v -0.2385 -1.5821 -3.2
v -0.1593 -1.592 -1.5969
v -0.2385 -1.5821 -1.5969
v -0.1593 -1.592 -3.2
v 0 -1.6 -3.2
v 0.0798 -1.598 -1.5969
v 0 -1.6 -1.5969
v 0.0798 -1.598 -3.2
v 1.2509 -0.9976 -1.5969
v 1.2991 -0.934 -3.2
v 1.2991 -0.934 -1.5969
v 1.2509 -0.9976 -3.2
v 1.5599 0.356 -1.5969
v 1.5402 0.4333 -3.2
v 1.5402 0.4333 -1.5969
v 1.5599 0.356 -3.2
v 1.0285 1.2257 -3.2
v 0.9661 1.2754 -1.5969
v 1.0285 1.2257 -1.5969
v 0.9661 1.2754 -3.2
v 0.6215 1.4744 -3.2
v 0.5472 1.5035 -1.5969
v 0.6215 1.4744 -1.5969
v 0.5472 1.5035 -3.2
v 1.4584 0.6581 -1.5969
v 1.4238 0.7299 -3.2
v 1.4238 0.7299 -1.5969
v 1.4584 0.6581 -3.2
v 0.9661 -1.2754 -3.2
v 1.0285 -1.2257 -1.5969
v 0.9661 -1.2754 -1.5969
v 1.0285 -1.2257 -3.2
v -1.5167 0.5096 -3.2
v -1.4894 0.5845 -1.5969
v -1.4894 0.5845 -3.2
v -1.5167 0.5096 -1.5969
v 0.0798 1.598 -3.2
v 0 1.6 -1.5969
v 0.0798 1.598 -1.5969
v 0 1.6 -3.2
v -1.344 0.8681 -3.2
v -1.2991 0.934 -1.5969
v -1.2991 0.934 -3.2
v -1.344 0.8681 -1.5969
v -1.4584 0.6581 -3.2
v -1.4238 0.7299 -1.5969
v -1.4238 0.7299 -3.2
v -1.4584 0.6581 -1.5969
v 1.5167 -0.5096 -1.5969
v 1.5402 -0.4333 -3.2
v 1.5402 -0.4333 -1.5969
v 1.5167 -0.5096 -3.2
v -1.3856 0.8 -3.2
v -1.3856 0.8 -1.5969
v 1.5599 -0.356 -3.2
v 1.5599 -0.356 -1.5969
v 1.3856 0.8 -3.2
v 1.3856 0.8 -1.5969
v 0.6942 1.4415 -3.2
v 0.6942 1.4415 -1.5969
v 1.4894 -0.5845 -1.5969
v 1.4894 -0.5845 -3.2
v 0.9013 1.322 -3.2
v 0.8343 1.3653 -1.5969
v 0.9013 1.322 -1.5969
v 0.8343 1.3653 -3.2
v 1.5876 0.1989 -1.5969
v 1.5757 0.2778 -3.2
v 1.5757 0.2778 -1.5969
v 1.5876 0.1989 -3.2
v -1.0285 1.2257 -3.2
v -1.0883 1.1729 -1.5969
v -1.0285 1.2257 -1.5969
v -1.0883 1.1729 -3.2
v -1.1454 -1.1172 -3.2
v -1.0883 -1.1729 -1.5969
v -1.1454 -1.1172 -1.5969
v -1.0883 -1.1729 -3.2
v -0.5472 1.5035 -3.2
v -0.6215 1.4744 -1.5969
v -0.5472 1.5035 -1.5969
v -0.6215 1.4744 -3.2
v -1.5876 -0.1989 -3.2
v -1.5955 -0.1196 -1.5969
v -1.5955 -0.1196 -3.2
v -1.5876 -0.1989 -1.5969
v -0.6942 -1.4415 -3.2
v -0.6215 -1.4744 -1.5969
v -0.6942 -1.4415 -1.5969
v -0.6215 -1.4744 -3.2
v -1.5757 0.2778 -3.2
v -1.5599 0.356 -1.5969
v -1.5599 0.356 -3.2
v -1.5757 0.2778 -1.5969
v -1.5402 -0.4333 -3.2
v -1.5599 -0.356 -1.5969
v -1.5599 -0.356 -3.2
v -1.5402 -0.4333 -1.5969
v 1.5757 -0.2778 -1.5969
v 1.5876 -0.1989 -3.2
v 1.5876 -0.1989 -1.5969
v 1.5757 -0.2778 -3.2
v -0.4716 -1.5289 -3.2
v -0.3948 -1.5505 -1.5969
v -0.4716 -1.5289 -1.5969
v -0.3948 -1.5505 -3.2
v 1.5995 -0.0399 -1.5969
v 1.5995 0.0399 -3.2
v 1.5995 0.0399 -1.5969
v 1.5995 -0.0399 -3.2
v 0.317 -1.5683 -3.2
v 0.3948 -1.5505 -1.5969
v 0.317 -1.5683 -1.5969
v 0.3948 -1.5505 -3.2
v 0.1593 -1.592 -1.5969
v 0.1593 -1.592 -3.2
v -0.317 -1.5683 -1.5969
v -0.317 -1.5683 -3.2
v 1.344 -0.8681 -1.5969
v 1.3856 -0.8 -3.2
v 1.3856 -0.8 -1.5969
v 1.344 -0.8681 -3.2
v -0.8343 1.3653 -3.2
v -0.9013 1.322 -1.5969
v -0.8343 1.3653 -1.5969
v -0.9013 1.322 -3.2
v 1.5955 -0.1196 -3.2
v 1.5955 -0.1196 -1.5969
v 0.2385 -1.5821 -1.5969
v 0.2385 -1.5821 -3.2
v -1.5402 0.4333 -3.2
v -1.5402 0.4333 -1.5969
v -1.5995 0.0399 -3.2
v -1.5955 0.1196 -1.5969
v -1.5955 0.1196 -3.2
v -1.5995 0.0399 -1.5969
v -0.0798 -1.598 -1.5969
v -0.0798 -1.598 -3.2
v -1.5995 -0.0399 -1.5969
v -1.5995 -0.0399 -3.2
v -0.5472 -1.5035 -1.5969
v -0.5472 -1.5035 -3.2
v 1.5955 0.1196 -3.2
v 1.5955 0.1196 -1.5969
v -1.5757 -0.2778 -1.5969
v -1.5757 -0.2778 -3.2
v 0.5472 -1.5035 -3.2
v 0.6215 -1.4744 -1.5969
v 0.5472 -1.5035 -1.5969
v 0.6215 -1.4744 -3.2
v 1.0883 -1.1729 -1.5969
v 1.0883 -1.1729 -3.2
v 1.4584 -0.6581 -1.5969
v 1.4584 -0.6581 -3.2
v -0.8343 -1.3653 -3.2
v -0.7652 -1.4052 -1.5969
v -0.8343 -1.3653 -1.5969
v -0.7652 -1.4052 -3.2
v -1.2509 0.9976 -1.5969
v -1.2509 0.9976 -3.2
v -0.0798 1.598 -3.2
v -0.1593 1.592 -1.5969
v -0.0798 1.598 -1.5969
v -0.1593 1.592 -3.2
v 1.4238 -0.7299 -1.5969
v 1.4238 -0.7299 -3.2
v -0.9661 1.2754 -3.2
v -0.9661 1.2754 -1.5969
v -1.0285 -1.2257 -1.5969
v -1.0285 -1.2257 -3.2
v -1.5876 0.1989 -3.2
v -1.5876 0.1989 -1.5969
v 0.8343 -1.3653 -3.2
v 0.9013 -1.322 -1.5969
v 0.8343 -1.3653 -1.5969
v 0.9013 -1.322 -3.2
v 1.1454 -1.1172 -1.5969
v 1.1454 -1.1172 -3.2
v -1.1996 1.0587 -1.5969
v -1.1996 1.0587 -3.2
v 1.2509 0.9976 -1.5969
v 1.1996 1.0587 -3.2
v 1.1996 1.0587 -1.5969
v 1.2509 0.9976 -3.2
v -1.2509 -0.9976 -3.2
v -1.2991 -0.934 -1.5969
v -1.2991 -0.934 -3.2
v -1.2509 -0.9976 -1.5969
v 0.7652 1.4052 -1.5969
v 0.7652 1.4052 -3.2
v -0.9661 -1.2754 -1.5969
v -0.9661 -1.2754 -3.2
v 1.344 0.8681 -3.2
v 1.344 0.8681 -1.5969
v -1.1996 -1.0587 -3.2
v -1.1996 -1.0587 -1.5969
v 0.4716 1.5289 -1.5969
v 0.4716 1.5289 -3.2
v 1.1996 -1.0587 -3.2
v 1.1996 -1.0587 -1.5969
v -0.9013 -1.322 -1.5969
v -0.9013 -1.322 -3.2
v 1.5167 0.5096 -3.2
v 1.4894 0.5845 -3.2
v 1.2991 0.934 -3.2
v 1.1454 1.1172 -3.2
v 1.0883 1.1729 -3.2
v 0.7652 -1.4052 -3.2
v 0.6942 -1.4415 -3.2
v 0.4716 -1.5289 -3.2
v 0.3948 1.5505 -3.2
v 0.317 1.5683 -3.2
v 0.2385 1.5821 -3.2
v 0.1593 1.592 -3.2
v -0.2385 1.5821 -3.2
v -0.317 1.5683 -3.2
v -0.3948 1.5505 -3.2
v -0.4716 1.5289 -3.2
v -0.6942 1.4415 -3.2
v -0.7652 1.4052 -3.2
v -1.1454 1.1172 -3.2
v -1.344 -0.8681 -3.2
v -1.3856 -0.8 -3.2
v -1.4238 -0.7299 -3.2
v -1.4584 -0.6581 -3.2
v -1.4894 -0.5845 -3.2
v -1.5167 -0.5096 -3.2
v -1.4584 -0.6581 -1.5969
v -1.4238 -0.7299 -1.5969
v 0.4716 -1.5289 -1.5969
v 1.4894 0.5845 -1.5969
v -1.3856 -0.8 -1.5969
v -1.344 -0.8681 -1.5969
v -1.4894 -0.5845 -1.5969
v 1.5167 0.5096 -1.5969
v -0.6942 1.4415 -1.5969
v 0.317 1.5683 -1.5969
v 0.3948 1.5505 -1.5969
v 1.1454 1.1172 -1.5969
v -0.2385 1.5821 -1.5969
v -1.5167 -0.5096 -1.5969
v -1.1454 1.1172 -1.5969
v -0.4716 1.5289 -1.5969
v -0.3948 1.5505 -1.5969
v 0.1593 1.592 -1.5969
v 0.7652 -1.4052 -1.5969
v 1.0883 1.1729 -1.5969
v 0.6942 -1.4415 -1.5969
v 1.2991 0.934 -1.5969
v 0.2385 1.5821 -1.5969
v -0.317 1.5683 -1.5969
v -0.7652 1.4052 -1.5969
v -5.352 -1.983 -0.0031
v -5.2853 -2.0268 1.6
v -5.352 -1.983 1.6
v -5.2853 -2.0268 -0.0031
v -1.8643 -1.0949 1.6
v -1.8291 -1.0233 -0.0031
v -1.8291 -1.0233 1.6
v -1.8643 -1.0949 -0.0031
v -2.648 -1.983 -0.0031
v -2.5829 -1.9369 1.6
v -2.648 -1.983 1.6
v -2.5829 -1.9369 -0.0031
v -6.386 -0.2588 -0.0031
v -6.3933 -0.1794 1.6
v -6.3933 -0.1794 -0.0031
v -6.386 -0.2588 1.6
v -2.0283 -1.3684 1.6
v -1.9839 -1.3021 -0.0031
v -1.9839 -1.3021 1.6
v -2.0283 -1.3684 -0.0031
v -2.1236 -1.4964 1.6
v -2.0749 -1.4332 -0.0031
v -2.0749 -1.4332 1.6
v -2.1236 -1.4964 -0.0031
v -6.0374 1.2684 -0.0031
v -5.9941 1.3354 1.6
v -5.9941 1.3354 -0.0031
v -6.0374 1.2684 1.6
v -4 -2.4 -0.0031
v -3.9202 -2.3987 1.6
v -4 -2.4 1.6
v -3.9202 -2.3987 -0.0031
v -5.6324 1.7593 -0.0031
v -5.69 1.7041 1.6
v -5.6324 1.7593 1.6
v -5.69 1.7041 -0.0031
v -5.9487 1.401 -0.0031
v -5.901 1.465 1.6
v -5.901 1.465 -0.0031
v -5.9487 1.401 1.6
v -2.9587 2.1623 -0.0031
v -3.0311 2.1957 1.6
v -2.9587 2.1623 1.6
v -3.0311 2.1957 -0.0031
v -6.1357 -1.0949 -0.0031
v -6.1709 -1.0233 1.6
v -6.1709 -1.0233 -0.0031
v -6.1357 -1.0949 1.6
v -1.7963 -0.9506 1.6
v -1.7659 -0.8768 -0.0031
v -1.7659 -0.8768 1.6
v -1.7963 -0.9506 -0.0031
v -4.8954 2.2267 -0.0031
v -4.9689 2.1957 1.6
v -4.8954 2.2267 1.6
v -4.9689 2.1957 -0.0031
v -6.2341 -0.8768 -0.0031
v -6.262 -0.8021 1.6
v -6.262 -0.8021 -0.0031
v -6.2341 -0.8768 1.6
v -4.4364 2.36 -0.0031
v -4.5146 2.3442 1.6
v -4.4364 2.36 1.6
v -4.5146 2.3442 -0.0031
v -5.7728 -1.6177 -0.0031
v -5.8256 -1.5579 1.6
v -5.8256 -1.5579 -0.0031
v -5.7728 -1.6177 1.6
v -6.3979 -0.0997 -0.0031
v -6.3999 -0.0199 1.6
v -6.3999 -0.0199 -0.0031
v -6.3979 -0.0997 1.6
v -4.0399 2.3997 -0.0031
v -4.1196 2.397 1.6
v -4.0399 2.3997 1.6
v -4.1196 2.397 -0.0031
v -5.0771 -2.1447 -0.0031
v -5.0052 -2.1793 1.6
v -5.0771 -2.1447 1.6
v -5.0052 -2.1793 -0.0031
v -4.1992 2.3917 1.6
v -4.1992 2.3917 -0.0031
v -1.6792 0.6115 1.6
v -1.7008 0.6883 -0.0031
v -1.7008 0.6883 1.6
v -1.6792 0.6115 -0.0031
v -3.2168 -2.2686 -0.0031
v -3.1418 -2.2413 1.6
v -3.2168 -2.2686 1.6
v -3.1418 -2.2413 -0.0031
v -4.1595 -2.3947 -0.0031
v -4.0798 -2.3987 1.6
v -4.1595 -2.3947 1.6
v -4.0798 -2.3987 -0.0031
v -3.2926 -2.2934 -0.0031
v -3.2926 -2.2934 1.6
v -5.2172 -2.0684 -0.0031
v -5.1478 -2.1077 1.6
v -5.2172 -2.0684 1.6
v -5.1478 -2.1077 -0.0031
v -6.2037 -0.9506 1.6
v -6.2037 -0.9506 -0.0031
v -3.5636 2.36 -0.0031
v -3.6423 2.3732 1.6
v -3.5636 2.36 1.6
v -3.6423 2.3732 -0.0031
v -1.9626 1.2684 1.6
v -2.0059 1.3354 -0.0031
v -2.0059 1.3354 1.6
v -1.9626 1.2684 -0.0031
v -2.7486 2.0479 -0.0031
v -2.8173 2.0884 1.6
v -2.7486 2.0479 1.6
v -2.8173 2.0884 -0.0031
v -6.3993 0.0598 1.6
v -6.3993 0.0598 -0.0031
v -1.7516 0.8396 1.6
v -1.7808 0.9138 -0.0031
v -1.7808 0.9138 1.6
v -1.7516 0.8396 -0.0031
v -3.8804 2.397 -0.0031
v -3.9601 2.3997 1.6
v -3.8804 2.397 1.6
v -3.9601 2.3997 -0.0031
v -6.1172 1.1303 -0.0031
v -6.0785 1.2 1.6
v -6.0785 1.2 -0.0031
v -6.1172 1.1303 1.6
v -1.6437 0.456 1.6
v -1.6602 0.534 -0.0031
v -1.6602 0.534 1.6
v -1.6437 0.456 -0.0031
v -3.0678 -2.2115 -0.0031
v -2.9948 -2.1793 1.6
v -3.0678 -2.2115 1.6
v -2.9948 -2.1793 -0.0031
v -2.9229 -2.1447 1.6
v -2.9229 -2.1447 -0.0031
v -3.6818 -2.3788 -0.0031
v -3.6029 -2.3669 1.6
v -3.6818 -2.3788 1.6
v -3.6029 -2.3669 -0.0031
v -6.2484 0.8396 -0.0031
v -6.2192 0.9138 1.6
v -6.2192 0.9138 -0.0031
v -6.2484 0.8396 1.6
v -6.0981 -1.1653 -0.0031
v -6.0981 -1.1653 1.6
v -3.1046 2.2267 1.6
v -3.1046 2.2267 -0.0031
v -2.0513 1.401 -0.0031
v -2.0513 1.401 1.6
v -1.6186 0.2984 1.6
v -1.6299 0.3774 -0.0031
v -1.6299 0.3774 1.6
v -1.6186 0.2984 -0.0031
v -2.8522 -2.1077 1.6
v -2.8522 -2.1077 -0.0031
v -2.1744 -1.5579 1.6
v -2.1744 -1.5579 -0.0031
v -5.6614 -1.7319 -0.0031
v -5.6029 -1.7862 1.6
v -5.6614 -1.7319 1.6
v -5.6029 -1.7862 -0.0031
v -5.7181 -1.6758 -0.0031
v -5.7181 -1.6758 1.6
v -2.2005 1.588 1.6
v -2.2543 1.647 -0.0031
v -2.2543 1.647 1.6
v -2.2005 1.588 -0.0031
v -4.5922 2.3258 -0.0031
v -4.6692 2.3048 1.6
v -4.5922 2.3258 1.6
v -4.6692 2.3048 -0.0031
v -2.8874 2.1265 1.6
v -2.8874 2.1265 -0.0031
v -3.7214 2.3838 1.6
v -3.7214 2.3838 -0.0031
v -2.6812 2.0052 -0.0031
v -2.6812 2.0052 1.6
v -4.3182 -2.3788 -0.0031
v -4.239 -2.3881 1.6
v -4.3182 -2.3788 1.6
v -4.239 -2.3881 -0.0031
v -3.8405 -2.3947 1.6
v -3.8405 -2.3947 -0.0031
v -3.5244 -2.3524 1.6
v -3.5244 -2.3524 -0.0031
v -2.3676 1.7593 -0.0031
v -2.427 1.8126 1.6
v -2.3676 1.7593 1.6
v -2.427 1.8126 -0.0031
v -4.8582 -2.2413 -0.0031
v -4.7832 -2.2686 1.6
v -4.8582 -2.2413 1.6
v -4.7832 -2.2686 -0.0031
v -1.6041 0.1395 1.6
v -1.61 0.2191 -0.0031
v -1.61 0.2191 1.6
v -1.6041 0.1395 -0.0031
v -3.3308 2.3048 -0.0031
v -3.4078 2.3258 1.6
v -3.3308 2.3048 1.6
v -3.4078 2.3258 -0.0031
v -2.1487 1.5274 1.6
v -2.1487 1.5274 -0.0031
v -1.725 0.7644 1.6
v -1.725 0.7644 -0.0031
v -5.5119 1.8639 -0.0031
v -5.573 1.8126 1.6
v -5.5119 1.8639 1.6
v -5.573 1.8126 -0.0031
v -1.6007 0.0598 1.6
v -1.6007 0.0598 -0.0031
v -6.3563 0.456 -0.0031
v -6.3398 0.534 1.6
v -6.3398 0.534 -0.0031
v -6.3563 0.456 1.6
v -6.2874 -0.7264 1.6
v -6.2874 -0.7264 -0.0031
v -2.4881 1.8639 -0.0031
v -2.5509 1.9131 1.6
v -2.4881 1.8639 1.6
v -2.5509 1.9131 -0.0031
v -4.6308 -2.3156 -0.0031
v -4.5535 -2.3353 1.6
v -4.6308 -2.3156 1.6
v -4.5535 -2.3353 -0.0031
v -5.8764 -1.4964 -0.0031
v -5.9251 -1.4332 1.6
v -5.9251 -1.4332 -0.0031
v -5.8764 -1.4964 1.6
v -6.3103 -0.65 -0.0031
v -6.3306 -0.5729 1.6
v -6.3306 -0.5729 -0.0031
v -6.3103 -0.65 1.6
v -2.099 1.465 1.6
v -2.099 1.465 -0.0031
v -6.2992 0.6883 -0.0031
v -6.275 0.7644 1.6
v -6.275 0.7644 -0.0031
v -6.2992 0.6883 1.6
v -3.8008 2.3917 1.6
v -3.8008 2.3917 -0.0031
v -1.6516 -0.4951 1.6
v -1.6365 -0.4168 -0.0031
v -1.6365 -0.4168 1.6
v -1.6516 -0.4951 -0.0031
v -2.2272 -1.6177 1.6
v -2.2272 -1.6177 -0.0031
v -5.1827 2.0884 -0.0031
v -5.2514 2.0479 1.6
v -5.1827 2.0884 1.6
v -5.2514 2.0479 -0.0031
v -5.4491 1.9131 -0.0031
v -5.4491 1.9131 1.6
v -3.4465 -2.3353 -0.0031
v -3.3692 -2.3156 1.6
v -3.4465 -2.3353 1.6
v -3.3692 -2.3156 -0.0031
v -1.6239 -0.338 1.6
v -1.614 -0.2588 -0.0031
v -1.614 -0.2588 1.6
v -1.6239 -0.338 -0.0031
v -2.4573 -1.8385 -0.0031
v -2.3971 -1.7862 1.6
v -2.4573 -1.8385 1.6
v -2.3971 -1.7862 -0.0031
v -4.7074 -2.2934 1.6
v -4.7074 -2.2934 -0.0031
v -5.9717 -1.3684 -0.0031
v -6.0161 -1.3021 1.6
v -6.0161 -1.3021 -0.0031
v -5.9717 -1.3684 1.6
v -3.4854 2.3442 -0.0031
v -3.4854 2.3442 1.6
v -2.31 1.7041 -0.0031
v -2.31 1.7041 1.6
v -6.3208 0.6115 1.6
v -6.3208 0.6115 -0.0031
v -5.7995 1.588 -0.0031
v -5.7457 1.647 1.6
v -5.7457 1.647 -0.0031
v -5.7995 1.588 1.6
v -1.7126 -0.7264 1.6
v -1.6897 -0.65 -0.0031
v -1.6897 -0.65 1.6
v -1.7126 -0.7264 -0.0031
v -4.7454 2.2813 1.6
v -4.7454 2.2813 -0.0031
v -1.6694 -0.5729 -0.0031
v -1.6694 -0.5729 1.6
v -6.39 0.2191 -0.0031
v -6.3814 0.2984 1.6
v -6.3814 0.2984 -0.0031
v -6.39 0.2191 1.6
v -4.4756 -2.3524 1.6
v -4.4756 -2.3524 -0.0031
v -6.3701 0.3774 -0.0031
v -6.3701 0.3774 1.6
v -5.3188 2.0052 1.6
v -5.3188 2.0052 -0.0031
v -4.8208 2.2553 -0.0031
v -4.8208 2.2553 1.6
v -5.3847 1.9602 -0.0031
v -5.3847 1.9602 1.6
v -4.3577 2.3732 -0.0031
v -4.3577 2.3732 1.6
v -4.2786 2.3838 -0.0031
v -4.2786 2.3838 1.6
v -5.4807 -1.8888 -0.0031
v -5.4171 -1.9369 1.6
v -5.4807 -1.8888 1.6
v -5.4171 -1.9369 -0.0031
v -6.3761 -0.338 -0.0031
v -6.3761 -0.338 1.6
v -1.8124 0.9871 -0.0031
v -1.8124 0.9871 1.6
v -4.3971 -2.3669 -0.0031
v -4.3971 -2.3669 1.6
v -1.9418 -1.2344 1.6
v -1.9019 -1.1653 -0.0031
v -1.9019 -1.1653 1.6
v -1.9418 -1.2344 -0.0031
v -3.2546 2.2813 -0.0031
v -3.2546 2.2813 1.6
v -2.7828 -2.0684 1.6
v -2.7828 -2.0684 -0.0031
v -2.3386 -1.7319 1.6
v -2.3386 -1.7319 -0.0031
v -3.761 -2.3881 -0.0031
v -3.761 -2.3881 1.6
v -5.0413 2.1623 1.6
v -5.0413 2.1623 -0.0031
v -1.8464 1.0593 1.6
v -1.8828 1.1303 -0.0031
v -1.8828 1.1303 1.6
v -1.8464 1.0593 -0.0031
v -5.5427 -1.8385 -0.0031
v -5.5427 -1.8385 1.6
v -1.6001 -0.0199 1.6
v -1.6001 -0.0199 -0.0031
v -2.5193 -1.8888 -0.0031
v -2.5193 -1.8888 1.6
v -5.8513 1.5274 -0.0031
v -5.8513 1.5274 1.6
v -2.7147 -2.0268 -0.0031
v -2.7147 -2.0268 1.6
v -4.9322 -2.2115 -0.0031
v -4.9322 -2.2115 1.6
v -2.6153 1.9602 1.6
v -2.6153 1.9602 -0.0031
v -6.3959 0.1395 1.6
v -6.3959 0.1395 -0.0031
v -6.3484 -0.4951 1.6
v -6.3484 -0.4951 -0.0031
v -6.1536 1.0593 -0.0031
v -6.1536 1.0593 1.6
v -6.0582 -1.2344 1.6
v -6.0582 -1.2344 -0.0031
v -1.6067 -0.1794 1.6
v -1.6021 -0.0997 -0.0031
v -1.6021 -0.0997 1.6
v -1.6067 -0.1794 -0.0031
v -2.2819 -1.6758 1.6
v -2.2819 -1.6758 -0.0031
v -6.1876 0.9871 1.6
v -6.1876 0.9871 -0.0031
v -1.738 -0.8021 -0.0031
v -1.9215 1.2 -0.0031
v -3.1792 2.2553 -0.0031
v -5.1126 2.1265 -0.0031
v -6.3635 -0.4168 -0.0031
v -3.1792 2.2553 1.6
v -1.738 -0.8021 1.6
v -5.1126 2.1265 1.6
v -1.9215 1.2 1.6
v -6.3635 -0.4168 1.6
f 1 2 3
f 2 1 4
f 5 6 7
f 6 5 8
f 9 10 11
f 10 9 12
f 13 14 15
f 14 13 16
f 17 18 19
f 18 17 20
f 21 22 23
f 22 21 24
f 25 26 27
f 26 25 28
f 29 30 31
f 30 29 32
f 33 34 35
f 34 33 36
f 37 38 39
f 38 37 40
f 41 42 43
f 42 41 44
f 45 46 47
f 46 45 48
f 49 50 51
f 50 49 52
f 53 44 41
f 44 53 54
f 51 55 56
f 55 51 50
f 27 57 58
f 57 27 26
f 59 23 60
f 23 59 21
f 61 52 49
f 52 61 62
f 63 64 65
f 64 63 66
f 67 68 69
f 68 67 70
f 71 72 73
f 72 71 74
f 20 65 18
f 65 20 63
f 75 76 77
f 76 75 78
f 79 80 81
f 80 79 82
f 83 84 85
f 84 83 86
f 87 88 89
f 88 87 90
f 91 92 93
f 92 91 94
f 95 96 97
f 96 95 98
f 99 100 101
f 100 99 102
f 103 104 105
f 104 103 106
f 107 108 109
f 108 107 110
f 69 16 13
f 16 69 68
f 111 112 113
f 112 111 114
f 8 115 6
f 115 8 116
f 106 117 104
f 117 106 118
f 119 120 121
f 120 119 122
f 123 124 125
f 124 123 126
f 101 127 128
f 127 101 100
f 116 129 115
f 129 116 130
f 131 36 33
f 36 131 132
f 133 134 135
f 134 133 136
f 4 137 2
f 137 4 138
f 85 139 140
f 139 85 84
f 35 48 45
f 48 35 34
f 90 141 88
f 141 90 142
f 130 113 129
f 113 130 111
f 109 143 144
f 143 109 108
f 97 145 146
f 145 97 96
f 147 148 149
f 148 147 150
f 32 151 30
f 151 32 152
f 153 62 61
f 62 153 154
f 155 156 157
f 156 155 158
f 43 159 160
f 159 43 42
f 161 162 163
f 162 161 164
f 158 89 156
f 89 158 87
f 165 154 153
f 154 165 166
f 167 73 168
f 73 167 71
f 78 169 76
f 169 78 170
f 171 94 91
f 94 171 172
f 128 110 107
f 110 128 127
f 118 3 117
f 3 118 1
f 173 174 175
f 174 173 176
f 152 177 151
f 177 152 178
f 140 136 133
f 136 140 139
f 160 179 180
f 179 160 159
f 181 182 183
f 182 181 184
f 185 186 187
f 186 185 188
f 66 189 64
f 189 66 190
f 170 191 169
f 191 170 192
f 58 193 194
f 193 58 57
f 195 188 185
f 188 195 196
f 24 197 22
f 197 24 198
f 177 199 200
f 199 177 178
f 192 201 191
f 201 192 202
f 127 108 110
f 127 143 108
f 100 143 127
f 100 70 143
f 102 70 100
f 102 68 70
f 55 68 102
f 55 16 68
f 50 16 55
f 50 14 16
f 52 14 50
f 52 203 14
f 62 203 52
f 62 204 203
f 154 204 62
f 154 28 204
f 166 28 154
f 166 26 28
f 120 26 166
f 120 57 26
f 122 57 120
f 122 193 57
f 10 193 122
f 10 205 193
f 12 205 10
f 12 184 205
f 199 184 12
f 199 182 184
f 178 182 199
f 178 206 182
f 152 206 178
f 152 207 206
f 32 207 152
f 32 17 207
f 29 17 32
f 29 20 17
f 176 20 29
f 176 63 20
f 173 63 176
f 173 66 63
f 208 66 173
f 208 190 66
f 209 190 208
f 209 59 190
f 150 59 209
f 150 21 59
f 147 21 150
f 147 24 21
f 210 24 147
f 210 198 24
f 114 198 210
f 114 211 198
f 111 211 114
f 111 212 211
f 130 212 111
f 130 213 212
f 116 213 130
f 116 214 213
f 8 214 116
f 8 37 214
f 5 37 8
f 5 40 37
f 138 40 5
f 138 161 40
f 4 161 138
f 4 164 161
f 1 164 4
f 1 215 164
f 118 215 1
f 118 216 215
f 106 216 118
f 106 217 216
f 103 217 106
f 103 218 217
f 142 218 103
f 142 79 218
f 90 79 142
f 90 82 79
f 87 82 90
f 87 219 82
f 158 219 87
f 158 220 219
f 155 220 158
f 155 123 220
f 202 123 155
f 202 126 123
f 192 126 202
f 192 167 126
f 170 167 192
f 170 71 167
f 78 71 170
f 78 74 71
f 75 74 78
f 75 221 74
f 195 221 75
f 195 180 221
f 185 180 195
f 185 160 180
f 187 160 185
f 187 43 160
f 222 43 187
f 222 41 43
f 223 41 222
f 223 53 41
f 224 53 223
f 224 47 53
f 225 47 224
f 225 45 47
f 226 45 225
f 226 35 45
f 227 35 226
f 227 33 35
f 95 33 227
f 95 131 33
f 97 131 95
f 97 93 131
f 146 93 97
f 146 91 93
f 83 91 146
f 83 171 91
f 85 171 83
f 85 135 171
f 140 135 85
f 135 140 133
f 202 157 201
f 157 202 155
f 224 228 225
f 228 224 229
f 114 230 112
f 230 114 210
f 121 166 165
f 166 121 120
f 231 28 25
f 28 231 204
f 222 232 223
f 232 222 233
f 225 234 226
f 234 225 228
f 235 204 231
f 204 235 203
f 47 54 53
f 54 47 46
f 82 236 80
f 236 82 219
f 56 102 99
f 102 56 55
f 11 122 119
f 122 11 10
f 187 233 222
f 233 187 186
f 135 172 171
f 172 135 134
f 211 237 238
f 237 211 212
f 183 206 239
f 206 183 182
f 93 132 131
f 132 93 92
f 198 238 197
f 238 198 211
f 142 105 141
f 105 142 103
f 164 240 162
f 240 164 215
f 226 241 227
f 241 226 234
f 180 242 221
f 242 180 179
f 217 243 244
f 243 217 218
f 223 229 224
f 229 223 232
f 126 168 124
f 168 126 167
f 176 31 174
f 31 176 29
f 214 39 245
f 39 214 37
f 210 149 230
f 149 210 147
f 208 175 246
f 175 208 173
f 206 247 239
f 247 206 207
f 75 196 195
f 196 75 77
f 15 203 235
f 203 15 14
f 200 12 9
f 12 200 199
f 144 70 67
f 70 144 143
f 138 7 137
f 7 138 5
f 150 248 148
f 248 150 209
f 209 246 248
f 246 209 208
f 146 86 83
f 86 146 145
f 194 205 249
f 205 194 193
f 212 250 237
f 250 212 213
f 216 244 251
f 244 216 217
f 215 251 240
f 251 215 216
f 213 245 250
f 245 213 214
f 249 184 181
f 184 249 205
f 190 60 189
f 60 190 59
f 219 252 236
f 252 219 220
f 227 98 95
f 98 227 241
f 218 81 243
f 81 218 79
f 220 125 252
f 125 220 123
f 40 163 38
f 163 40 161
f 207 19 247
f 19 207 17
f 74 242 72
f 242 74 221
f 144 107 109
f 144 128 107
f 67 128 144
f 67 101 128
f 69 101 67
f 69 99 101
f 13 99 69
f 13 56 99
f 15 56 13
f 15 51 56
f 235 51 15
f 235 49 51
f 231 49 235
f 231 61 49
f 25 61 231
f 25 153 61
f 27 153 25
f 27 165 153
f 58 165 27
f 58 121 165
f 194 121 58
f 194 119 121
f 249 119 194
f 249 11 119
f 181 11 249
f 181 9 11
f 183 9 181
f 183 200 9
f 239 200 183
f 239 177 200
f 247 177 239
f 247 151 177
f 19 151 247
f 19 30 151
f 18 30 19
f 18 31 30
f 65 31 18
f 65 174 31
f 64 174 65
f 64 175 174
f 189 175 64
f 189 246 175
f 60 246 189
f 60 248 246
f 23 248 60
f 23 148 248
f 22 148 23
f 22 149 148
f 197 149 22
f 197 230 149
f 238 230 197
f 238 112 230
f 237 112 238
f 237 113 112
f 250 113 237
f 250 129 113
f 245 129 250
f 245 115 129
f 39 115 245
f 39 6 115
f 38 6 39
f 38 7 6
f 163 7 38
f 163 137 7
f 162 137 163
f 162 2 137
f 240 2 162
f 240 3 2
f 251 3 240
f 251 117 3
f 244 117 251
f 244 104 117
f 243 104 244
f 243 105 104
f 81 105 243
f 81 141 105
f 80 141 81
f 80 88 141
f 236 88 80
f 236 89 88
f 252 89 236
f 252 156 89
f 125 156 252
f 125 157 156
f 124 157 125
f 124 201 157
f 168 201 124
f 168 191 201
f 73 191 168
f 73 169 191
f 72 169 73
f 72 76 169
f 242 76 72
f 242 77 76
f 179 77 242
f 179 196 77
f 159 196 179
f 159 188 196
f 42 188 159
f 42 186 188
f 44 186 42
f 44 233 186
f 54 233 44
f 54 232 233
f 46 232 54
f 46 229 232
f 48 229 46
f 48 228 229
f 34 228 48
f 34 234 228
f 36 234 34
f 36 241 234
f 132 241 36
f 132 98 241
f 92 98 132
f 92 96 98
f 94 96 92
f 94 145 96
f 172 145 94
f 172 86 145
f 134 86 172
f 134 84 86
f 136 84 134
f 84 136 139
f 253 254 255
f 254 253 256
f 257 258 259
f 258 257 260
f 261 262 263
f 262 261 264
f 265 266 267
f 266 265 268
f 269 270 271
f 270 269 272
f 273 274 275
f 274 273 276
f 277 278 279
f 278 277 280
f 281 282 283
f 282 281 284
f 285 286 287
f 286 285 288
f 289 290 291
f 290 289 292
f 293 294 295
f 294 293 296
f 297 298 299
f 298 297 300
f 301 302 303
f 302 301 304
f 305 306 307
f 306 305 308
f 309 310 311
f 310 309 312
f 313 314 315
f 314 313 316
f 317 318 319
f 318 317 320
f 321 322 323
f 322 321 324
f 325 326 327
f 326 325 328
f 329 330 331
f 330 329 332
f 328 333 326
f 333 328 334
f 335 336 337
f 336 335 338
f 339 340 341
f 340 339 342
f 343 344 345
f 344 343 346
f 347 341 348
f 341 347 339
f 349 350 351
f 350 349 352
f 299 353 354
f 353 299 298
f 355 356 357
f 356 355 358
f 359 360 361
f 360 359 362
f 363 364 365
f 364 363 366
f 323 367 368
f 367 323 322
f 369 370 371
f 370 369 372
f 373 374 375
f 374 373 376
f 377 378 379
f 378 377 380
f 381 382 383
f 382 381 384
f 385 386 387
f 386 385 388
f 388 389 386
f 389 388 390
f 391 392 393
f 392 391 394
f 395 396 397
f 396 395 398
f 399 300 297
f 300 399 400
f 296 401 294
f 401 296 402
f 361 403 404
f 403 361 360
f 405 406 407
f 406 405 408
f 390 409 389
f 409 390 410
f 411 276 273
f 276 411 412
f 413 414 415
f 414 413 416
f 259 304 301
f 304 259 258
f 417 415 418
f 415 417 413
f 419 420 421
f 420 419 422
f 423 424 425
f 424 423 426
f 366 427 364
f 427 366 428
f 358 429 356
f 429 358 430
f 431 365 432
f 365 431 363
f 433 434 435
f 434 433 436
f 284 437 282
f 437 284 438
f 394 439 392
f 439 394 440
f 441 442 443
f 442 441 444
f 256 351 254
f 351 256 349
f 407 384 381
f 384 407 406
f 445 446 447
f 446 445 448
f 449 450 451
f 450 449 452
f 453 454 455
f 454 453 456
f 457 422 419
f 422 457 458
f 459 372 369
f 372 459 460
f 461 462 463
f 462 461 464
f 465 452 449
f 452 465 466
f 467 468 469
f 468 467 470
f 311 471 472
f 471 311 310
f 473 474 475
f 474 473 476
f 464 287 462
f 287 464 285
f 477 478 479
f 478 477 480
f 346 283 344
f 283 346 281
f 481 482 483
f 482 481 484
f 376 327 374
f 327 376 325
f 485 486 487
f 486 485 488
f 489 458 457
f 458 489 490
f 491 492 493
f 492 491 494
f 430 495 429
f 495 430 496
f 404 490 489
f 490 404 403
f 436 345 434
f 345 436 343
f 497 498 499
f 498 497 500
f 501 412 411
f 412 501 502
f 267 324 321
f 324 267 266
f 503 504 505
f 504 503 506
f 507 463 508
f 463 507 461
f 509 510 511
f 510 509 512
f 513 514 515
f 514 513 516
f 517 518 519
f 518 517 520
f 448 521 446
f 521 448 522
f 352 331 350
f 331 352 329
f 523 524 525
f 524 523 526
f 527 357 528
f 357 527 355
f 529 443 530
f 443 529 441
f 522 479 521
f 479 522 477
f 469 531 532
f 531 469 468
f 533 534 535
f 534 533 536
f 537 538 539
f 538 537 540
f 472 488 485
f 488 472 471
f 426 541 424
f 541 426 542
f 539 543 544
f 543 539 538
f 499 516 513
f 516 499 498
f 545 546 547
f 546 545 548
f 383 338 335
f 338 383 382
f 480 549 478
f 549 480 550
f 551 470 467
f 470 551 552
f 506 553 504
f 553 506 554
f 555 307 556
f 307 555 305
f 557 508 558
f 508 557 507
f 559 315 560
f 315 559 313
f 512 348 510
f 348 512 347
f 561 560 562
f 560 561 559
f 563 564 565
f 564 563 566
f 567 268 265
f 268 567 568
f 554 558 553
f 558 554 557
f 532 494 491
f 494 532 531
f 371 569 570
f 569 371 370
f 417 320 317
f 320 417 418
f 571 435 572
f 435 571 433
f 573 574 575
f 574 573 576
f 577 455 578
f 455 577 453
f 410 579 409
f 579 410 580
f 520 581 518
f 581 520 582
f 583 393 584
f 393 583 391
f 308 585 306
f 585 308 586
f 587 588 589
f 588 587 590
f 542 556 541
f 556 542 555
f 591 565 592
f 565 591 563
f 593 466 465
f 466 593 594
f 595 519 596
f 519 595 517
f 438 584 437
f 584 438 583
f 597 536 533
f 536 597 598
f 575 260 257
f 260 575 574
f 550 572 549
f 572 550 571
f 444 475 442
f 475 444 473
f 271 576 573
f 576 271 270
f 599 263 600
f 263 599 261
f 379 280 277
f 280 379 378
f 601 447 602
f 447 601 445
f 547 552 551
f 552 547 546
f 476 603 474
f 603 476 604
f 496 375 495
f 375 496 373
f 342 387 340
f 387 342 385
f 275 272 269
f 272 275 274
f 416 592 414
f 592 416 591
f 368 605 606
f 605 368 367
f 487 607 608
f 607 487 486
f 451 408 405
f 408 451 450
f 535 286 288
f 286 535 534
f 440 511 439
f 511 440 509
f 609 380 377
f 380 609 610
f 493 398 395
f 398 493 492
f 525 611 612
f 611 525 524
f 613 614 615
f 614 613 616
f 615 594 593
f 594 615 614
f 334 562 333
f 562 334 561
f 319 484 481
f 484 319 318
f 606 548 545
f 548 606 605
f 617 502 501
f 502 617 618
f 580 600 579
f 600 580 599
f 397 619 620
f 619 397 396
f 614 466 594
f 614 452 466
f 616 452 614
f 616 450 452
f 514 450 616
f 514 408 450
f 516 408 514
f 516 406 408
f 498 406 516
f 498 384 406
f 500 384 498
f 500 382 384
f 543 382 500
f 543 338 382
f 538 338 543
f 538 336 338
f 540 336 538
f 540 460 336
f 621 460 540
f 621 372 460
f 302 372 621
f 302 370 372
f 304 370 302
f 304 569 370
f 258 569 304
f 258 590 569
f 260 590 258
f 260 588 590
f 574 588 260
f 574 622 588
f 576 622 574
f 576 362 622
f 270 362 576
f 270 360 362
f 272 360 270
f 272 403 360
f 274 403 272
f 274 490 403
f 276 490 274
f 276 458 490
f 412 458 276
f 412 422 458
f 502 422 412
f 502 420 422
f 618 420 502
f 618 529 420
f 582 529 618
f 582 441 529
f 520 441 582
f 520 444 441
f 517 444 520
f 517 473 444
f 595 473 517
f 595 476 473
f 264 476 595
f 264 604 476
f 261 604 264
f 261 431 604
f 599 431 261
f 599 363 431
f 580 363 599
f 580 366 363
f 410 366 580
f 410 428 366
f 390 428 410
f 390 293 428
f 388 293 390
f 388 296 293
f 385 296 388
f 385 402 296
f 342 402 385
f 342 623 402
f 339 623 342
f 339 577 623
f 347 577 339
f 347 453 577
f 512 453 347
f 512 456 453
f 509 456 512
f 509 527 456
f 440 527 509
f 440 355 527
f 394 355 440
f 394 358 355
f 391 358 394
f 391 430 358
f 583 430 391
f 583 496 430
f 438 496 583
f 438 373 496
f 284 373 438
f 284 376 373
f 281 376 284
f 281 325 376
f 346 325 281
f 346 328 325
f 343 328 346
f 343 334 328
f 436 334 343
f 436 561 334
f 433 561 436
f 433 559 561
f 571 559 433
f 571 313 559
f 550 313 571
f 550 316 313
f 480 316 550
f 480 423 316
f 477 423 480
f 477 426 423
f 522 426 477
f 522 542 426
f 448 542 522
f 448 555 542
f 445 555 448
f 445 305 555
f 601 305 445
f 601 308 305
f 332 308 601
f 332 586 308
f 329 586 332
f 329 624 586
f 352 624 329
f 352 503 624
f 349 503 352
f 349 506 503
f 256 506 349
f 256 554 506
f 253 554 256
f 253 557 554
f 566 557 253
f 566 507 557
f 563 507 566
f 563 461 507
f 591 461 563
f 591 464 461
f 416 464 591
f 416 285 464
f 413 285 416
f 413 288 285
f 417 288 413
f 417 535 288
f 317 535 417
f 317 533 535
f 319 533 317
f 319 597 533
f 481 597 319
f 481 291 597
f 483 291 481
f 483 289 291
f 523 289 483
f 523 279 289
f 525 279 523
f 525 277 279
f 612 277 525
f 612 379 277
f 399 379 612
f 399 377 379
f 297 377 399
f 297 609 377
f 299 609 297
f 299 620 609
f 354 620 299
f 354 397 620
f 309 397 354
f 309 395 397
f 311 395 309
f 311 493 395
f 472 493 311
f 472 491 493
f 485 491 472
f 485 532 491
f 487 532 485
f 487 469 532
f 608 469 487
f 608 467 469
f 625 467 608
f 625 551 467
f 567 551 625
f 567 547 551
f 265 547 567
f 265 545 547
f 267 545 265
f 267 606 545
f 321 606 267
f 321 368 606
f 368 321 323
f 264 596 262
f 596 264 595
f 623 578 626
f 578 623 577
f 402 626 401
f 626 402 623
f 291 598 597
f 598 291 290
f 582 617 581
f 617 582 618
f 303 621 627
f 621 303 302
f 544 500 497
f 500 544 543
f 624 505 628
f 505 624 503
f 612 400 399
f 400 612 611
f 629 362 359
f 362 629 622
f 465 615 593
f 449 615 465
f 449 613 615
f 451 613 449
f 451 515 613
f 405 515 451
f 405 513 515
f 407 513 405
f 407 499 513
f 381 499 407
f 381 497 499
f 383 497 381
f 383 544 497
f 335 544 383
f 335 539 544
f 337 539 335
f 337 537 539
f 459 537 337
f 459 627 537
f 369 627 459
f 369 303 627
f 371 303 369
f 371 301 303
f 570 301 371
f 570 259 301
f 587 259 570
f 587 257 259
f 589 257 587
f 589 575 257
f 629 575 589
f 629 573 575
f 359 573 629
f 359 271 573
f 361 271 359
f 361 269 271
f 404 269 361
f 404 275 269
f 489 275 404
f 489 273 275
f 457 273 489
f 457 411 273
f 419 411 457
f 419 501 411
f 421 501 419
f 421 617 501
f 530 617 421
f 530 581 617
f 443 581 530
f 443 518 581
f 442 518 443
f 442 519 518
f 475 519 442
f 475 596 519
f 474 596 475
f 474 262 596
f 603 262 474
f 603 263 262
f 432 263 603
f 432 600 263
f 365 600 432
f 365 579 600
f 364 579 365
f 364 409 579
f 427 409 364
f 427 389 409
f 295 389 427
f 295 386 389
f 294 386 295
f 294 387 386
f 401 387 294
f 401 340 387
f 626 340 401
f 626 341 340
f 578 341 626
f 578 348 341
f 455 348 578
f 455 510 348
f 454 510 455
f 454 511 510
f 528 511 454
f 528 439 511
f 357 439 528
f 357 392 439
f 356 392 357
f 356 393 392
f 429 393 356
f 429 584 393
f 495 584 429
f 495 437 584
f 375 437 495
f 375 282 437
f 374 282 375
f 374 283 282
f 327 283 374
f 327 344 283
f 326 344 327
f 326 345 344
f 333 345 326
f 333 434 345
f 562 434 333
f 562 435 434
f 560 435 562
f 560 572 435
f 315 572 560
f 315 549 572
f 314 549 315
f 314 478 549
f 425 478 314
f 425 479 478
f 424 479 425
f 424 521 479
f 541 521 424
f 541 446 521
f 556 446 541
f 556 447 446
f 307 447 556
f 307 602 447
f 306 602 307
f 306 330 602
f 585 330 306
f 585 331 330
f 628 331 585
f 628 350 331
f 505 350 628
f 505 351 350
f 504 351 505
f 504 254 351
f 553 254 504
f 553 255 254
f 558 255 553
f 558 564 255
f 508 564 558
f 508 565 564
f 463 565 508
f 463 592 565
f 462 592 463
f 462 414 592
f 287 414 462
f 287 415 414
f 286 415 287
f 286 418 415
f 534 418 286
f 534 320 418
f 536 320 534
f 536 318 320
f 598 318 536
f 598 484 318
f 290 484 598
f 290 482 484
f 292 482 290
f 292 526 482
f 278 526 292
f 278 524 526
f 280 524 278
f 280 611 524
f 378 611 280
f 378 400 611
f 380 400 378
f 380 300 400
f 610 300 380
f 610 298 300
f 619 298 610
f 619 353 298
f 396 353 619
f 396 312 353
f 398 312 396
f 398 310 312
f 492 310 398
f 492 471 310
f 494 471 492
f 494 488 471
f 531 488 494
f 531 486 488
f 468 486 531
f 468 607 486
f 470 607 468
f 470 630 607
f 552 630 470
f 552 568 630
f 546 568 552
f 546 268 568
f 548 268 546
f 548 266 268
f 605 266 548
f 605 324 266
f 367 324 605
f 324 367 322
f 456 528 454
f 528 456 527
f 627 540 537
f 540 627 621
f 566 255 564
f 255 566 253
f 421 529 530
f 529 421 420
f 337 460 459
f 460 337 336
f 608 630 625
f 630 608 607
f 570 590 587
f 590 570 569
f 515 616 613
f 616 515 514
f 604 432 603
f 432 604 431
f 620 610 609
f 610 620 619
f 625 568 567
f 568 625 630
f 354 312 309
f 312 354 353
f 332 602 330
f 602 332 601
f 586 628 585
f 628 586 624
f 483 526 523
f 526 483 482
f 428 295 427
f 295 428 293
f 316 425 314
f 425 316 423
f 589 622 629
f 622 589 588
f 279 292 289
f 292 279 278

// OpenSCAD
use <../lib.scad>
use <../p/box2-5.scad>
use <../p/box4o4a.scad>
use <../p/box5.scad>
use <../p/clip13.scad>
use <../p/rect2p.scad>
use <../p/recte4.scad>
use <../p/stud.scad>
use <../p/stud3.scad>
$fa=1; $fs=0.2;
function ldraw_lib__44861(realsolid=false) = [
// 0 Plate  1 x  2 with Single Clip on Top (Thick C-Clip)
// 0 Name: 44861.dat
// 0 Author: Vincent Messenet [Cheenzo]
// 0 !LDRAW_ORG Part UPDATE 2020-03
// 0 !LICENSE Licensed under CC BY 2.0 and CC BY 4.0 : see CAreadme.txt
// 
// 0 BFC CERTIFY CCW
  [0,"BFC","CERTIFY"],
  [0,"BFC","CCW"],
// 
// 0 !HISTORY 2020-12-29 [PTadmin] Official Update 2020-03
// 
// 
// 1 16 0 4 0 1 0 0 0 -1 0 0 0 1 stud3.dat
  [1,16,0,4,0,1,0,0,0,-1,0,0,0,1, ldraw_lib__stud3(realsolid)],
// 0 BFC INVERTNEXT
  [0,"BFC","INVERTNEXT"],
// 1 16 0 8 0 16 0 0 0 -4 0 0 0 6 box5.dat
  [1,16,0,8,0,16,0,0,0,-4,0,0,0,6, ldraw_lib__box5(realsolid)],
// 1 16 0 8 0 20 0 0 0 1 0 0 0 10 recte4.dat
  [1,16,0,8,0,20,0,0,0,1,0,0,0,10, ldraw_lib__recte4(realsolid)],
// 4 16 20 8 10 16 8 6 -16 8 6 -20 8 10
  [4,16,20,8,10,16,8,6,-16,8,6,-20,8,10],
// 4 16 20 8 -10 16 8 -6 16 8 6 20 8 10
  [4,16,20,8,-10,16,8,-6,16,8,6,20,8,10],
// 4 16 -20 8 -10 -16 8 -6 16 8 -6 20 8 -10
  [4,16,-20,8,-10,-16,8,-6,16,8,-6,20,8,-10],
// 4 16 -20 8 10 -16 8 6 -16 8 -6 -20 8 -10
  [4,16,-20,8,10,-16,8,6,-16,8,-6,-20,8,-10],
// 4 16 20 1 10 20 8 10 -20 8 10 0 1 10
  [4,16,20,1,10,20,8,10,-20,8,10,0,1,10],
// 4 16 0 1 -10 -20 8 -10 20 8 -10 20 1 -10
  [4,16,0,1,-10,-20,8,-10,20,8,-10,20,1,-10],
// 1 16 -10 4 0 0 -10 0 0 0 -4 -10 0 0 box2-5.dat
  [1,16,-10,4,0,0,-10,0,0,0,-4,-10,0,0, ldraw_lib__box2_5(realsolid)],
// 1 16 10 4.5 0 0 10 0 0 0 -3.5 10 0 0 box2-5.dat
  [1,16,10,4.5,0,0,10,0,0,0,-3.5,10,0,0, ldraw_lib__box2_5(realsolid)],
// 1 16 0 .5 0 0 -1 0 .5 0 0 0 0 10 rect2p.dat
  [1,16,0,.5,0,0,-1,0,.5,0,0,0,0,10, ldraw_lib__rect2p(realsolid)],
// 4 16 -20 8 -10 0 1 -10 0 0 -10 -20 0 -10
  [4,16,-20,8,-10,0,1,-10,0,0,-10,-20,0,-10],
// 4 16 -20 0 10 0 0 10 0 1 10 -20 8 10
  [4,16,-20,0,10,0,0,10,0,1,10,-20,8,10],
// 1 16 -10 0 0 1 0 0 0 1 0 0 0 1 stud.dat
  [1,16,-10,0,0,1,0,0,0,1,0,0,0,1, ldraw_lib__stud(realsolid)],
// 1 16 10 -6 0 1 0 0 0 0 1 0 1 0 clip13.dat
  [1,16,10,-6,0,1,0,0,0,0,1,0,1,0, ldraw_lib__clip13(realsolid)],
// 1 16 10 1 0 4.5 0 0 0 -1 0 0 0 4 box4o4a.dat
  [1,16,10,1,0,4.5,0,0,0,-1,0,0,0,4, ldraw_lib__box4o4a(realsolid)],
// 4 16 5.5 0 -4 3.674 -1.804 -4 3.674 -1.804 4 5.5 0 4
  [4,16,5.5,0,-4,3.674,-1.804,-4,3.674,-1.804,4,5.5,0,4],
// 4 16 3.674 -1.804 -4 5.5 0 -4 14.5 0 -4 16.326 -1.804 -4
  [4,16,3.674,-1.804,-4,5.5,0,-4,14.5,0,-4,16.326,-1.804,-4],
// 4 16 16.326 -1.804 -4 14.5 0 -4 14.5 0 4 16.326 -1.804 4
  [4,16,16.326,-1.804,-4,14.5,0,-4,14.5,0,4,16.326,-1.804,4],
// 4 16 3.674 -1.804 4 16.326 -1.804 4 14.5 0 4 5.5 0 4
  [4,16,3.674,-1.804,4,16.326,-1.804,4,14.5,0,4,5.5,0,4],
// 2 24 16.326 -1.804 -4 14.5 0 -4
  [2,24,16.326,-1.804,-4,14.5,0,-4],
// 2 24 16.326 -1.804 4 14.5 0 4
  [2,24,16.326,-1.804,4,14.5,0,4],
// 2 24 3.674 -1.804 -4 5.5 0 -4
  [2,24,3.674,-1.804,-4,5.5,0,-4],
// 2 24 3.674 -1.804 4 5.5 0 4
  [2,24,3.674,-1.804,4,5.5,0,4],
// 5 24 14.5 0 4 14.5 0 -4 16.326 -1.804 -4 14.5 1 -4
  [5,24,14.5,0,4,14.5,0,-4,16.326,-1.804,-4,14.5,1,-4],
// 5 24 5.5 0 4 5.5 0 -4 3.674 -1.804 -4 5.5 1 -4
  [5,24,5.5,0,4,5.5,0,-4,3.674,-1.804,-4,5.5,1,-4],
// 5 24 3.674 -1.804 -4 3.674 -1.804 4 5.5 0 -4 2.53875 -4.46285 -4
  [5,24,3.674,-1.804,-4,3.674,-1.804,4,5.5,0,-4,2.53875,-4.46285,-4],
// 5 24 16.326 -1.804 4 16.326 -1.804 -4 14.5 0 -4 17.4612 -4.46285 -4
  [5,24,16.326,-1.804,4,16.326,-1.804,-4,14.5,0,-4,17.4612,-4.46285,-4],
];
module ldraw_lib__44861(step=0, col=false, unit=2/5, alt=false, line=0.2, solid=!$preview)
    makepoly(ldraw_lib__44861(solid), step=step, col=col, unit=unit, alt=alt, line=line, solid=solid);
ldraw_lib__44861(line=0.2);
